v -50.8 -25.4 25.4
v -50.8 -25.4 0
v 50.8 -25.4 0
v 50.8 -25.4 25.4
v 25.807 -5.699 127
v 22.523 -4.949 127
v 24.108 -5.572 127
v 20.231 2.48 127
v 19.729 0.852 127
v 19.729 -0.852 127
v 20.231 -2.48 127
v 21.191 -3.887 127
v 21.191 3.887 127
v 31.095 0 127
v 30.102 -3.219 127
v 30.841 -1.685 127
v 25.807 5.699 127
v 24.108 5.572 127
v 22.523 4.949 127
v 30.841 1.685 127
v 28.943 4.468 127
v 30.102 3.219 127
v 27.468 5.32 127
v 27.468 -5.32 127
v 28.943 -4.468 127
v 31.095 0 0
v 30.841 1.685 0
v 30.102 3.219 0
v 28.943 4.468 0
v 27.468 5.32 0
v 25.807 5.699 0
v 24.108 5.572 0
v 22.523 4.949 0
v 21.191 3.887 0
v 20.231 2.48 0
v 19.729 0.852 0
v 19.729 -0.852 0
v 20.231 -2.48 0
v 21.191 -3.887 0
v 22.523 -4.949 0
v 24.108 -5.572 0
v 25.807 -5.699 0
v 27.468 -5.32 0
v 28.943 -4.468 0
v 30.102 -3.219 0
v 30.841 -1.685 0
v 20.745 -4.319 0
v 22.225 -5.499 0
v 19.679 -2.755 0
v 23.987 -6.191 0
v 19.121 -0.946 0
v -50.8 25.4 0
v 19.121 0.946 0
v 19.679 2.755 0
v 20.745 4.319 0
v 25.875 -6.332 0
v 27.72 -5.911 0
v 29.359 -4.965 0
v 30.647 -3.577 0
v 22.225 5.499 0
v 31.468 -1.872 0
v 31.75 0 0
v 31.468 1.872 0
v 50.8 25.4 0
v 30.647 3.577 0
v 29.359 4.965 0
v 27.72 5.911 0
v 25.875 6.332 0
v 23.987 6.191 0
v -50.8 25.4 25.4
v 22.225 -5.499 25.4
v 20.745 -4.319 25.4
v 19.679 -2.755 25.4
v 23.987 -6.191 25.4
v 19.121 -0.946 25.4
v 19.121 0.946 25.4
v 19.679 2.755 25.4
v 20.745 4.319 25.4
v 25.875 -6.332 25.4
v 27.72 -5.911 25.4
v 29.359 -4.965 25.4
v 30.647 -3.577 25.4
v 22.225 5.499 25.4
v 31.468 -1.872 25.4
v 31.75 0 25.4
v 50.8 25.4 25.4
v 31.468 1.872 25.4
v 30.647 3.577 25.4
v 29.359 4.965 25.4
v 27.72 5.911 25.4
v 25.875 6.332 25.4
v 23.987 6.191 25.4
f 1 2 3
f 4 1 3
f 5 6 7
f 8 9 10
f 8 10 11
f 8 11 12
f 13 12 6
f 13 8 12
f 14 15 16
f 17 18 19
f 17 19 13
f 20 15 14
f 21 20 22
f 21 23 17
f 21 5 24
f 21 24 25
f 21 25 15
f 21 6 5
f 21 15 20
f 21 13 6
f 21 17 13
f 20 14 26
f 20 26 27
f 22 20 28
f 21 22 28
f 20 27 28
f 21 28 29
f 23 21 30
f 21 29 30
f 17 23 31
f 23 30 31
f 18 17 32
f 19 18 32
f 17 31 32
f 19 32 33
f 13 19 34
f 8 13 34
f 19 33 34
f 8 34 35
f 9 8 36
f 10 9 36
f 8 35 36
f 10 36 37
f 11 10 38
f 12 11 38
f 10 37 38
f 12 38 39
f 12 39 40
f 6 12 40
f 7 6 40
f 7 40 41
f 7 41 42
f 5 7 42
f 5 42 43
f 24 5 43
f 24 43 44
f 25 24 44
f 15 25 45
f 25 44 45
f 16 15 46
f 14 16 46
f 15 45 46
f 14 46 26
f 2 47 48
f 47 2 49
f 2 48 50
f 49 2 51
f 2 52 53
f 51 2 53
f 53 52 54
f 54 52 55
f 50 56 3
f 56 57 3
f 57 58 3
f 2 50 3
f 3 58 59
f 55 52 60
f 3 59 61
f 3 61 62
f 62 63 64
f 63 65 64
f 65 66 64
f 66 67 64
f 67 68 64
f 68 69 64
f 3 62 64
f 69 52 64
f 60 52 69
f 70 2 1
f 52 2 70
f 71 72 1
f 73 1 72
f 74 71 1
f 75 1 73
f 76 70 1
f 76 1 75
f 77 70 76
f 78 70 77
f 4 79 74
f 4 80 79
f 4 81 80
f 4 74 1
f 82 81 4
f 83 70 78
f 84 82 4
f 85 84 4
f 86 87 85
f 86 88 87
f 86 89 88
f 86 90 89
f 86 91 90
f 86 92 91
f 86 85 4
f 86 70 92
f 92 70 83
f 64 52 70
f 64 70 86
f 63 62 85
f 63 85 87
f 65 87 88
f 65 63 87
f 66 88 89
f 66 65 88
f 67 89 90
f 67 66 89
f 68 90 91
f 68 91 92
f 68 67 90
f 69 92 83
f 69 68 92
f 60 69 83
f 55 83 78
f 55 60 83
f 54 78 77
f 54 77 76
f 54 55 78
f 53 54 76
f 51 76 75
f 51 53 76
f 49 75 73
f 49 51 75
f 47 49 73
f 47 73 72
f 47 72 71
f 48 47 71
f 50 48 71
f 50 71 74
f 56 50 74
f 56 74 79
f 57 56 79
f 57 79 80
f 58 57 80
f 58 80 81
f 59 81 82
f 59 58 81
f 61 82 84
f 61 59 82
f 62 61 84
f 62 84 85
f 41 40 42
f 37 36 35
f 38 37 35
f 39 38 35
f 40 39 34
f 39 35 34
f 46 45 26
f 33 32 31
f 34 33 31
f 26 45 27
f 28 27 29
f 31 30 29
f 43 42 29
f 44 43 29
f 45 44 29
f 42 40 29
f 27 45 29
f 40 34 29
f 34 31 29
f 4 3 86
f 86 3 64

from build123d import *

# Parameters (mm, degrees)
F0_W     = 101.6
F0_H     = 50.8
F0_R     = 6.35
F1_DEPTH = 25.4
F2_R     = 5.715
F3_DEPTH = 127


with BuildPart() as f1:
    # F0 (on Top) → F1 (new body)
    with BuildSketch(Plane.XY):
        Rectangle(F0_W, F0_H)
        with Locations((25.4, 0)):
            Circle(F0_R, mode=Mode.SUBTRACT)
    extrude(amount=F1_DEPTH)


with BuildPart() as f3:
    # F2 (on face) → F3 (new body)
    with BuildSketch(Plane.XY):
        with Locations((25.380079, 0)):
            Circle(F2_R)
    extrude(amount=F3_DEPTH)


solid = Compound([f1.part, f3.part])
